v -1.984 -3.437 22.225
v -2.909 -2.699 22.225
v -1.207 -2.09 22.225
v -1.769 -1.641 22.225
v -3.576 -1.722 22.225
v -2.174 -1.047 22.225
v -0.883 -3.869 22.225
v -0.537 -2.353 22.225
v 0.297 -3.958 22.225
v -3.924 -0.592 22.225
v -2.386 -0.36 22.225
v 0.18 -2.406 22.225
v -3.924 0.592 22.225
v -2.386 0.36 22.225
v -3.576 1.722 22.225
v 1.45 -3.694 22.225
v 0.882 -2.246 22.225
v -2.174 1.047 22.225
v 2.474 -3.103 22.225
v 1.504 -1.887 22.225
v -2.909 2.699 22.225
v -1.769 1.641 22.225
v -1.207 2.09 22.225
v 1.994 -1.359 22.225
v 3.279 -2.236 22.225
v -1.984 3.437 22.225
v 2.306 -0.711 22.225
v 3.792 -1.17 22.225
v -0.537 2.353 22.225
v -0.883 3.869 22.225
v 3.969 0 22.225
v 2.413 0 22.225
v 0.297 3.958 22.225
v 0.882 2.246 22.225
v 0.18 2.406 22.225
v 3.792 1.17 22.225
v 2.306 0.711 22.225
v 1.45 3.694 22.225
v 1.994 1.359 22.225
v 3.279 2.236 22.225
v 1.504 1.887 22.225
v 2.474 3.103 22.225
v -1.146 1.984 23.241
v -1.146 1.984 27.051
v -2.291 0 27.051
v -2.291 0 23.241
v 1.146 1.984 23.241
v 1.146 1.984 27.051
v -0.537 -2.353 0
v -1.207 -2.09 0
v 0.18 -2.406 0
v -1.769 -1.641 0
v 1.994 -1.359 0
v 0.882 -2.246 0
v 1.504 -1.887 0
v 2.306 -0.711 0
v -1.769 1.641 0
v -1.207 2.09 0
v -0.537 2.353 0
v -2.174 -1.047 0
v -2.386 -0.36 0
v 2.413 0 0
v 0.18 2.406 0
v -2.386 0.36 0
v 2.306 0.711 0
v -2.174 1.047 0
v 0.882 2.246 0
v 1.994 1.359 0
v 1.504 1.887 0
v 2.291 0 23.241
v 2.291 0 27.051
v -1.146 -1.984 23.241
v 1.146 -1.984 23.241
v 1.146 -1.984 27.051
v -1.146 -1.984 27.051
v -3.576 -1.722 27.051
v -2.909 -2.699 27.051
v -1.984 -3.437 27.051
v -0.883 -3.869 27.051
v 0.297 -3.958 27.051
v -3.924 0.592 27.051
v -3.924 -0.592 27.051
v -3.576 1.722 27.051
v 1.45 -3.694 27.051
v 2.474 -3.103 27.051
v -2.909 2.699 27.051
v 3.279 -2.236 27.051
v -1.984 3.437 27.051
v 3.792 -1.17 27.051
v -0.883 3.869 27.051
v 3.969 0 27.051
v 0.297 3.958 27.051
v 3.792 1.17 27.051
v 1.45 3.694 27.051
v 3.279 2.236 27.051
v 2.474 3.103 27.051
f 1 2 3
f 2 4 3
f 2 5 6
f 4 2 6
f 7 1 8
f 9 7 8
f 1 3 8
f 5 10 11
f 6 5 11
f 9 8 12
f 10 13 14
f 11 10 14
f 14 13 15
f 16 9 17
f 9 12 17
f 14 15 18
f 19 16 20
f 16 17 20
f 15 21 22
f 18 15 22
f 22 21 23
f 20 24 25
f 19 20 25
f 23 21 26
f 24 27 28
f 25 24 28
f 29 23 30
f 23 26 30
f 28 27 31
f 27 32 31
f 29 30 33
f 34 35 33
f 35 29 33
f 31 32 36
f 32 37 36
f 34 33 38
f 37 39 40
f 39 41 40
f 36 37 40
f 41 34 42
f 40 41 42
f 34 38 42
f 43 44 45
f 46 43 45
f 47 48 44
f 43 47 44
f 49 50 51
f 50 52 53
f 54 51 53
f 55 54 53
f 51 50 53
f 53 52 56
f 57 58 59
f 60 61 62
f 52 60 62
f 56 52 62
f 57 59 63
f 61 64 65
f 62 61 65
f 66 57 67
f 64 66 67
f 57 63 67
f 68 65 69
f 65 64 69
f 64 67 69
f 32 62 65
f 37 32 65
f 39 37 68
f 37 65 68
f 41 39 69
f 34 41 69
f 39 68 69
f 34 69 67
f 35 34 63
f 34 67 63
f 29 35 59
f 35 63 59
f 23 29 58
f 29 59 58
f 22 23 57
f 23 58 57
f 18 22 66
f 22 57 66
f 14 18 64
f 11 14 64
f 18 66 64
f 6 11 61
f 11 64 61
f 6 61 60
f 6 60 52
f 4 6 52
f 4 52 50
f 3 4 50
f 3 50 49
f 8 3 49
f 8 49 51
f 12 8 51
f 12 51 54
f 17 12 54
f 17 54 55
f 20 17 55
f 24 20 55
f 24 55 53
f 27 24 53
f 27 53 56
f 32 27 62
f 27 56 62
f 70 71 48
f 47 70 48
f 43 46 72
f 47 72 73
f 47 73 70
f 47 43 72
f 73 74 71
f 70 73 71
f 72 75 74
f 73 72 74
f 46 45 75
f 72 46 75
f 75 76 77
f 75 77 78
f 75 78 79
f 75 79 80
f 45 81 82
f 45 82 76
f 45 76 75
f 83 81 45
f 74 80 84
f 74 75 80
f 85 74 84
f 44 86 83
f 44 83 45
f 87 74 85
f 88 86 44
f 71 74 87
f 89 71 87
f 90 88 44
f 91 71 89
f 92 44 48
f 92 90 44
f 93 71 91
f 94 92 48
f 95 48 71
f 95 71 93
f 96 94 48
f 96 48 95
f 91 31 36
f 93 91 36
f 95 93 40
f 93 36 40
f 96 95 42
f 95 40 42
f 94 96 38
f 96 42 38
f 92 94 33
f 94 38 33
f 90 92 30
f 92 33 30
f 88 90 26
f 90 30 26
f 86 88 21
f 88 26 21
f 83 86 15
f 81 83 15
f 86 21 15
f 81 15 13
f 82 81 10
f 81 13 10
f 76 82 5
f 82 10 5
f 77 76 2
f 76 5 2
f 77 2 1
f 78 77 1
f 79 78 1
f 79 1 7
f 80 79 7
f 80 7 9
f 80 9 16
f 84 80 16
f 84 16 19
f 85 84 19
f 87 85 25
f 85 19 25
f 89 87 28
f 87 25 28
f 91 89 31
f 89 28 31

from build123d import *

# Parameters (mm, degrees)
SKETCH1_R           = 2.413
BOSS_EXTRUDE1_DEPTH = 22.225
SKETCH2_R           = 3.96875
BOSS_EXTRUDE2_DEPTH = 4.826
CUT_EXTRUDE1_DEPTH  = 3.81


with BuildPart() as part:
    # Sketch1 → Boss-Extrude1 (new body)
    with BuildSketch(Plane.XY):
        Circle(SKETCH1_R)
    extrude(amount=BOSS_EXTRUDE1_DEPTH)

    # Sketch2 → Boss-Extrude2 (add)
    with BuildSketch(Plane.XY.offset(22.225)):
        Circle(SKETCH2_R)
    extrude(amount=BOSS_EXTRUDE2_DEPTH)

    # Sketch3 → Cut-Extrude1 (cut)
    with BuildSketch(Plane.XY.offset(27.051)):
        Polygon((2.291358881, 0), (1.14567944, 1.984375), (-1.14567944, 1.984375), (-2.291358881, 0), (-1.14567944, -1.984375), (1.14567944, -1.984375), align=None)
    extrude(amount=-CUT_EXTRUDE1_DEPTH, mode=Mode.SUBTRACT)


solid = part.part
